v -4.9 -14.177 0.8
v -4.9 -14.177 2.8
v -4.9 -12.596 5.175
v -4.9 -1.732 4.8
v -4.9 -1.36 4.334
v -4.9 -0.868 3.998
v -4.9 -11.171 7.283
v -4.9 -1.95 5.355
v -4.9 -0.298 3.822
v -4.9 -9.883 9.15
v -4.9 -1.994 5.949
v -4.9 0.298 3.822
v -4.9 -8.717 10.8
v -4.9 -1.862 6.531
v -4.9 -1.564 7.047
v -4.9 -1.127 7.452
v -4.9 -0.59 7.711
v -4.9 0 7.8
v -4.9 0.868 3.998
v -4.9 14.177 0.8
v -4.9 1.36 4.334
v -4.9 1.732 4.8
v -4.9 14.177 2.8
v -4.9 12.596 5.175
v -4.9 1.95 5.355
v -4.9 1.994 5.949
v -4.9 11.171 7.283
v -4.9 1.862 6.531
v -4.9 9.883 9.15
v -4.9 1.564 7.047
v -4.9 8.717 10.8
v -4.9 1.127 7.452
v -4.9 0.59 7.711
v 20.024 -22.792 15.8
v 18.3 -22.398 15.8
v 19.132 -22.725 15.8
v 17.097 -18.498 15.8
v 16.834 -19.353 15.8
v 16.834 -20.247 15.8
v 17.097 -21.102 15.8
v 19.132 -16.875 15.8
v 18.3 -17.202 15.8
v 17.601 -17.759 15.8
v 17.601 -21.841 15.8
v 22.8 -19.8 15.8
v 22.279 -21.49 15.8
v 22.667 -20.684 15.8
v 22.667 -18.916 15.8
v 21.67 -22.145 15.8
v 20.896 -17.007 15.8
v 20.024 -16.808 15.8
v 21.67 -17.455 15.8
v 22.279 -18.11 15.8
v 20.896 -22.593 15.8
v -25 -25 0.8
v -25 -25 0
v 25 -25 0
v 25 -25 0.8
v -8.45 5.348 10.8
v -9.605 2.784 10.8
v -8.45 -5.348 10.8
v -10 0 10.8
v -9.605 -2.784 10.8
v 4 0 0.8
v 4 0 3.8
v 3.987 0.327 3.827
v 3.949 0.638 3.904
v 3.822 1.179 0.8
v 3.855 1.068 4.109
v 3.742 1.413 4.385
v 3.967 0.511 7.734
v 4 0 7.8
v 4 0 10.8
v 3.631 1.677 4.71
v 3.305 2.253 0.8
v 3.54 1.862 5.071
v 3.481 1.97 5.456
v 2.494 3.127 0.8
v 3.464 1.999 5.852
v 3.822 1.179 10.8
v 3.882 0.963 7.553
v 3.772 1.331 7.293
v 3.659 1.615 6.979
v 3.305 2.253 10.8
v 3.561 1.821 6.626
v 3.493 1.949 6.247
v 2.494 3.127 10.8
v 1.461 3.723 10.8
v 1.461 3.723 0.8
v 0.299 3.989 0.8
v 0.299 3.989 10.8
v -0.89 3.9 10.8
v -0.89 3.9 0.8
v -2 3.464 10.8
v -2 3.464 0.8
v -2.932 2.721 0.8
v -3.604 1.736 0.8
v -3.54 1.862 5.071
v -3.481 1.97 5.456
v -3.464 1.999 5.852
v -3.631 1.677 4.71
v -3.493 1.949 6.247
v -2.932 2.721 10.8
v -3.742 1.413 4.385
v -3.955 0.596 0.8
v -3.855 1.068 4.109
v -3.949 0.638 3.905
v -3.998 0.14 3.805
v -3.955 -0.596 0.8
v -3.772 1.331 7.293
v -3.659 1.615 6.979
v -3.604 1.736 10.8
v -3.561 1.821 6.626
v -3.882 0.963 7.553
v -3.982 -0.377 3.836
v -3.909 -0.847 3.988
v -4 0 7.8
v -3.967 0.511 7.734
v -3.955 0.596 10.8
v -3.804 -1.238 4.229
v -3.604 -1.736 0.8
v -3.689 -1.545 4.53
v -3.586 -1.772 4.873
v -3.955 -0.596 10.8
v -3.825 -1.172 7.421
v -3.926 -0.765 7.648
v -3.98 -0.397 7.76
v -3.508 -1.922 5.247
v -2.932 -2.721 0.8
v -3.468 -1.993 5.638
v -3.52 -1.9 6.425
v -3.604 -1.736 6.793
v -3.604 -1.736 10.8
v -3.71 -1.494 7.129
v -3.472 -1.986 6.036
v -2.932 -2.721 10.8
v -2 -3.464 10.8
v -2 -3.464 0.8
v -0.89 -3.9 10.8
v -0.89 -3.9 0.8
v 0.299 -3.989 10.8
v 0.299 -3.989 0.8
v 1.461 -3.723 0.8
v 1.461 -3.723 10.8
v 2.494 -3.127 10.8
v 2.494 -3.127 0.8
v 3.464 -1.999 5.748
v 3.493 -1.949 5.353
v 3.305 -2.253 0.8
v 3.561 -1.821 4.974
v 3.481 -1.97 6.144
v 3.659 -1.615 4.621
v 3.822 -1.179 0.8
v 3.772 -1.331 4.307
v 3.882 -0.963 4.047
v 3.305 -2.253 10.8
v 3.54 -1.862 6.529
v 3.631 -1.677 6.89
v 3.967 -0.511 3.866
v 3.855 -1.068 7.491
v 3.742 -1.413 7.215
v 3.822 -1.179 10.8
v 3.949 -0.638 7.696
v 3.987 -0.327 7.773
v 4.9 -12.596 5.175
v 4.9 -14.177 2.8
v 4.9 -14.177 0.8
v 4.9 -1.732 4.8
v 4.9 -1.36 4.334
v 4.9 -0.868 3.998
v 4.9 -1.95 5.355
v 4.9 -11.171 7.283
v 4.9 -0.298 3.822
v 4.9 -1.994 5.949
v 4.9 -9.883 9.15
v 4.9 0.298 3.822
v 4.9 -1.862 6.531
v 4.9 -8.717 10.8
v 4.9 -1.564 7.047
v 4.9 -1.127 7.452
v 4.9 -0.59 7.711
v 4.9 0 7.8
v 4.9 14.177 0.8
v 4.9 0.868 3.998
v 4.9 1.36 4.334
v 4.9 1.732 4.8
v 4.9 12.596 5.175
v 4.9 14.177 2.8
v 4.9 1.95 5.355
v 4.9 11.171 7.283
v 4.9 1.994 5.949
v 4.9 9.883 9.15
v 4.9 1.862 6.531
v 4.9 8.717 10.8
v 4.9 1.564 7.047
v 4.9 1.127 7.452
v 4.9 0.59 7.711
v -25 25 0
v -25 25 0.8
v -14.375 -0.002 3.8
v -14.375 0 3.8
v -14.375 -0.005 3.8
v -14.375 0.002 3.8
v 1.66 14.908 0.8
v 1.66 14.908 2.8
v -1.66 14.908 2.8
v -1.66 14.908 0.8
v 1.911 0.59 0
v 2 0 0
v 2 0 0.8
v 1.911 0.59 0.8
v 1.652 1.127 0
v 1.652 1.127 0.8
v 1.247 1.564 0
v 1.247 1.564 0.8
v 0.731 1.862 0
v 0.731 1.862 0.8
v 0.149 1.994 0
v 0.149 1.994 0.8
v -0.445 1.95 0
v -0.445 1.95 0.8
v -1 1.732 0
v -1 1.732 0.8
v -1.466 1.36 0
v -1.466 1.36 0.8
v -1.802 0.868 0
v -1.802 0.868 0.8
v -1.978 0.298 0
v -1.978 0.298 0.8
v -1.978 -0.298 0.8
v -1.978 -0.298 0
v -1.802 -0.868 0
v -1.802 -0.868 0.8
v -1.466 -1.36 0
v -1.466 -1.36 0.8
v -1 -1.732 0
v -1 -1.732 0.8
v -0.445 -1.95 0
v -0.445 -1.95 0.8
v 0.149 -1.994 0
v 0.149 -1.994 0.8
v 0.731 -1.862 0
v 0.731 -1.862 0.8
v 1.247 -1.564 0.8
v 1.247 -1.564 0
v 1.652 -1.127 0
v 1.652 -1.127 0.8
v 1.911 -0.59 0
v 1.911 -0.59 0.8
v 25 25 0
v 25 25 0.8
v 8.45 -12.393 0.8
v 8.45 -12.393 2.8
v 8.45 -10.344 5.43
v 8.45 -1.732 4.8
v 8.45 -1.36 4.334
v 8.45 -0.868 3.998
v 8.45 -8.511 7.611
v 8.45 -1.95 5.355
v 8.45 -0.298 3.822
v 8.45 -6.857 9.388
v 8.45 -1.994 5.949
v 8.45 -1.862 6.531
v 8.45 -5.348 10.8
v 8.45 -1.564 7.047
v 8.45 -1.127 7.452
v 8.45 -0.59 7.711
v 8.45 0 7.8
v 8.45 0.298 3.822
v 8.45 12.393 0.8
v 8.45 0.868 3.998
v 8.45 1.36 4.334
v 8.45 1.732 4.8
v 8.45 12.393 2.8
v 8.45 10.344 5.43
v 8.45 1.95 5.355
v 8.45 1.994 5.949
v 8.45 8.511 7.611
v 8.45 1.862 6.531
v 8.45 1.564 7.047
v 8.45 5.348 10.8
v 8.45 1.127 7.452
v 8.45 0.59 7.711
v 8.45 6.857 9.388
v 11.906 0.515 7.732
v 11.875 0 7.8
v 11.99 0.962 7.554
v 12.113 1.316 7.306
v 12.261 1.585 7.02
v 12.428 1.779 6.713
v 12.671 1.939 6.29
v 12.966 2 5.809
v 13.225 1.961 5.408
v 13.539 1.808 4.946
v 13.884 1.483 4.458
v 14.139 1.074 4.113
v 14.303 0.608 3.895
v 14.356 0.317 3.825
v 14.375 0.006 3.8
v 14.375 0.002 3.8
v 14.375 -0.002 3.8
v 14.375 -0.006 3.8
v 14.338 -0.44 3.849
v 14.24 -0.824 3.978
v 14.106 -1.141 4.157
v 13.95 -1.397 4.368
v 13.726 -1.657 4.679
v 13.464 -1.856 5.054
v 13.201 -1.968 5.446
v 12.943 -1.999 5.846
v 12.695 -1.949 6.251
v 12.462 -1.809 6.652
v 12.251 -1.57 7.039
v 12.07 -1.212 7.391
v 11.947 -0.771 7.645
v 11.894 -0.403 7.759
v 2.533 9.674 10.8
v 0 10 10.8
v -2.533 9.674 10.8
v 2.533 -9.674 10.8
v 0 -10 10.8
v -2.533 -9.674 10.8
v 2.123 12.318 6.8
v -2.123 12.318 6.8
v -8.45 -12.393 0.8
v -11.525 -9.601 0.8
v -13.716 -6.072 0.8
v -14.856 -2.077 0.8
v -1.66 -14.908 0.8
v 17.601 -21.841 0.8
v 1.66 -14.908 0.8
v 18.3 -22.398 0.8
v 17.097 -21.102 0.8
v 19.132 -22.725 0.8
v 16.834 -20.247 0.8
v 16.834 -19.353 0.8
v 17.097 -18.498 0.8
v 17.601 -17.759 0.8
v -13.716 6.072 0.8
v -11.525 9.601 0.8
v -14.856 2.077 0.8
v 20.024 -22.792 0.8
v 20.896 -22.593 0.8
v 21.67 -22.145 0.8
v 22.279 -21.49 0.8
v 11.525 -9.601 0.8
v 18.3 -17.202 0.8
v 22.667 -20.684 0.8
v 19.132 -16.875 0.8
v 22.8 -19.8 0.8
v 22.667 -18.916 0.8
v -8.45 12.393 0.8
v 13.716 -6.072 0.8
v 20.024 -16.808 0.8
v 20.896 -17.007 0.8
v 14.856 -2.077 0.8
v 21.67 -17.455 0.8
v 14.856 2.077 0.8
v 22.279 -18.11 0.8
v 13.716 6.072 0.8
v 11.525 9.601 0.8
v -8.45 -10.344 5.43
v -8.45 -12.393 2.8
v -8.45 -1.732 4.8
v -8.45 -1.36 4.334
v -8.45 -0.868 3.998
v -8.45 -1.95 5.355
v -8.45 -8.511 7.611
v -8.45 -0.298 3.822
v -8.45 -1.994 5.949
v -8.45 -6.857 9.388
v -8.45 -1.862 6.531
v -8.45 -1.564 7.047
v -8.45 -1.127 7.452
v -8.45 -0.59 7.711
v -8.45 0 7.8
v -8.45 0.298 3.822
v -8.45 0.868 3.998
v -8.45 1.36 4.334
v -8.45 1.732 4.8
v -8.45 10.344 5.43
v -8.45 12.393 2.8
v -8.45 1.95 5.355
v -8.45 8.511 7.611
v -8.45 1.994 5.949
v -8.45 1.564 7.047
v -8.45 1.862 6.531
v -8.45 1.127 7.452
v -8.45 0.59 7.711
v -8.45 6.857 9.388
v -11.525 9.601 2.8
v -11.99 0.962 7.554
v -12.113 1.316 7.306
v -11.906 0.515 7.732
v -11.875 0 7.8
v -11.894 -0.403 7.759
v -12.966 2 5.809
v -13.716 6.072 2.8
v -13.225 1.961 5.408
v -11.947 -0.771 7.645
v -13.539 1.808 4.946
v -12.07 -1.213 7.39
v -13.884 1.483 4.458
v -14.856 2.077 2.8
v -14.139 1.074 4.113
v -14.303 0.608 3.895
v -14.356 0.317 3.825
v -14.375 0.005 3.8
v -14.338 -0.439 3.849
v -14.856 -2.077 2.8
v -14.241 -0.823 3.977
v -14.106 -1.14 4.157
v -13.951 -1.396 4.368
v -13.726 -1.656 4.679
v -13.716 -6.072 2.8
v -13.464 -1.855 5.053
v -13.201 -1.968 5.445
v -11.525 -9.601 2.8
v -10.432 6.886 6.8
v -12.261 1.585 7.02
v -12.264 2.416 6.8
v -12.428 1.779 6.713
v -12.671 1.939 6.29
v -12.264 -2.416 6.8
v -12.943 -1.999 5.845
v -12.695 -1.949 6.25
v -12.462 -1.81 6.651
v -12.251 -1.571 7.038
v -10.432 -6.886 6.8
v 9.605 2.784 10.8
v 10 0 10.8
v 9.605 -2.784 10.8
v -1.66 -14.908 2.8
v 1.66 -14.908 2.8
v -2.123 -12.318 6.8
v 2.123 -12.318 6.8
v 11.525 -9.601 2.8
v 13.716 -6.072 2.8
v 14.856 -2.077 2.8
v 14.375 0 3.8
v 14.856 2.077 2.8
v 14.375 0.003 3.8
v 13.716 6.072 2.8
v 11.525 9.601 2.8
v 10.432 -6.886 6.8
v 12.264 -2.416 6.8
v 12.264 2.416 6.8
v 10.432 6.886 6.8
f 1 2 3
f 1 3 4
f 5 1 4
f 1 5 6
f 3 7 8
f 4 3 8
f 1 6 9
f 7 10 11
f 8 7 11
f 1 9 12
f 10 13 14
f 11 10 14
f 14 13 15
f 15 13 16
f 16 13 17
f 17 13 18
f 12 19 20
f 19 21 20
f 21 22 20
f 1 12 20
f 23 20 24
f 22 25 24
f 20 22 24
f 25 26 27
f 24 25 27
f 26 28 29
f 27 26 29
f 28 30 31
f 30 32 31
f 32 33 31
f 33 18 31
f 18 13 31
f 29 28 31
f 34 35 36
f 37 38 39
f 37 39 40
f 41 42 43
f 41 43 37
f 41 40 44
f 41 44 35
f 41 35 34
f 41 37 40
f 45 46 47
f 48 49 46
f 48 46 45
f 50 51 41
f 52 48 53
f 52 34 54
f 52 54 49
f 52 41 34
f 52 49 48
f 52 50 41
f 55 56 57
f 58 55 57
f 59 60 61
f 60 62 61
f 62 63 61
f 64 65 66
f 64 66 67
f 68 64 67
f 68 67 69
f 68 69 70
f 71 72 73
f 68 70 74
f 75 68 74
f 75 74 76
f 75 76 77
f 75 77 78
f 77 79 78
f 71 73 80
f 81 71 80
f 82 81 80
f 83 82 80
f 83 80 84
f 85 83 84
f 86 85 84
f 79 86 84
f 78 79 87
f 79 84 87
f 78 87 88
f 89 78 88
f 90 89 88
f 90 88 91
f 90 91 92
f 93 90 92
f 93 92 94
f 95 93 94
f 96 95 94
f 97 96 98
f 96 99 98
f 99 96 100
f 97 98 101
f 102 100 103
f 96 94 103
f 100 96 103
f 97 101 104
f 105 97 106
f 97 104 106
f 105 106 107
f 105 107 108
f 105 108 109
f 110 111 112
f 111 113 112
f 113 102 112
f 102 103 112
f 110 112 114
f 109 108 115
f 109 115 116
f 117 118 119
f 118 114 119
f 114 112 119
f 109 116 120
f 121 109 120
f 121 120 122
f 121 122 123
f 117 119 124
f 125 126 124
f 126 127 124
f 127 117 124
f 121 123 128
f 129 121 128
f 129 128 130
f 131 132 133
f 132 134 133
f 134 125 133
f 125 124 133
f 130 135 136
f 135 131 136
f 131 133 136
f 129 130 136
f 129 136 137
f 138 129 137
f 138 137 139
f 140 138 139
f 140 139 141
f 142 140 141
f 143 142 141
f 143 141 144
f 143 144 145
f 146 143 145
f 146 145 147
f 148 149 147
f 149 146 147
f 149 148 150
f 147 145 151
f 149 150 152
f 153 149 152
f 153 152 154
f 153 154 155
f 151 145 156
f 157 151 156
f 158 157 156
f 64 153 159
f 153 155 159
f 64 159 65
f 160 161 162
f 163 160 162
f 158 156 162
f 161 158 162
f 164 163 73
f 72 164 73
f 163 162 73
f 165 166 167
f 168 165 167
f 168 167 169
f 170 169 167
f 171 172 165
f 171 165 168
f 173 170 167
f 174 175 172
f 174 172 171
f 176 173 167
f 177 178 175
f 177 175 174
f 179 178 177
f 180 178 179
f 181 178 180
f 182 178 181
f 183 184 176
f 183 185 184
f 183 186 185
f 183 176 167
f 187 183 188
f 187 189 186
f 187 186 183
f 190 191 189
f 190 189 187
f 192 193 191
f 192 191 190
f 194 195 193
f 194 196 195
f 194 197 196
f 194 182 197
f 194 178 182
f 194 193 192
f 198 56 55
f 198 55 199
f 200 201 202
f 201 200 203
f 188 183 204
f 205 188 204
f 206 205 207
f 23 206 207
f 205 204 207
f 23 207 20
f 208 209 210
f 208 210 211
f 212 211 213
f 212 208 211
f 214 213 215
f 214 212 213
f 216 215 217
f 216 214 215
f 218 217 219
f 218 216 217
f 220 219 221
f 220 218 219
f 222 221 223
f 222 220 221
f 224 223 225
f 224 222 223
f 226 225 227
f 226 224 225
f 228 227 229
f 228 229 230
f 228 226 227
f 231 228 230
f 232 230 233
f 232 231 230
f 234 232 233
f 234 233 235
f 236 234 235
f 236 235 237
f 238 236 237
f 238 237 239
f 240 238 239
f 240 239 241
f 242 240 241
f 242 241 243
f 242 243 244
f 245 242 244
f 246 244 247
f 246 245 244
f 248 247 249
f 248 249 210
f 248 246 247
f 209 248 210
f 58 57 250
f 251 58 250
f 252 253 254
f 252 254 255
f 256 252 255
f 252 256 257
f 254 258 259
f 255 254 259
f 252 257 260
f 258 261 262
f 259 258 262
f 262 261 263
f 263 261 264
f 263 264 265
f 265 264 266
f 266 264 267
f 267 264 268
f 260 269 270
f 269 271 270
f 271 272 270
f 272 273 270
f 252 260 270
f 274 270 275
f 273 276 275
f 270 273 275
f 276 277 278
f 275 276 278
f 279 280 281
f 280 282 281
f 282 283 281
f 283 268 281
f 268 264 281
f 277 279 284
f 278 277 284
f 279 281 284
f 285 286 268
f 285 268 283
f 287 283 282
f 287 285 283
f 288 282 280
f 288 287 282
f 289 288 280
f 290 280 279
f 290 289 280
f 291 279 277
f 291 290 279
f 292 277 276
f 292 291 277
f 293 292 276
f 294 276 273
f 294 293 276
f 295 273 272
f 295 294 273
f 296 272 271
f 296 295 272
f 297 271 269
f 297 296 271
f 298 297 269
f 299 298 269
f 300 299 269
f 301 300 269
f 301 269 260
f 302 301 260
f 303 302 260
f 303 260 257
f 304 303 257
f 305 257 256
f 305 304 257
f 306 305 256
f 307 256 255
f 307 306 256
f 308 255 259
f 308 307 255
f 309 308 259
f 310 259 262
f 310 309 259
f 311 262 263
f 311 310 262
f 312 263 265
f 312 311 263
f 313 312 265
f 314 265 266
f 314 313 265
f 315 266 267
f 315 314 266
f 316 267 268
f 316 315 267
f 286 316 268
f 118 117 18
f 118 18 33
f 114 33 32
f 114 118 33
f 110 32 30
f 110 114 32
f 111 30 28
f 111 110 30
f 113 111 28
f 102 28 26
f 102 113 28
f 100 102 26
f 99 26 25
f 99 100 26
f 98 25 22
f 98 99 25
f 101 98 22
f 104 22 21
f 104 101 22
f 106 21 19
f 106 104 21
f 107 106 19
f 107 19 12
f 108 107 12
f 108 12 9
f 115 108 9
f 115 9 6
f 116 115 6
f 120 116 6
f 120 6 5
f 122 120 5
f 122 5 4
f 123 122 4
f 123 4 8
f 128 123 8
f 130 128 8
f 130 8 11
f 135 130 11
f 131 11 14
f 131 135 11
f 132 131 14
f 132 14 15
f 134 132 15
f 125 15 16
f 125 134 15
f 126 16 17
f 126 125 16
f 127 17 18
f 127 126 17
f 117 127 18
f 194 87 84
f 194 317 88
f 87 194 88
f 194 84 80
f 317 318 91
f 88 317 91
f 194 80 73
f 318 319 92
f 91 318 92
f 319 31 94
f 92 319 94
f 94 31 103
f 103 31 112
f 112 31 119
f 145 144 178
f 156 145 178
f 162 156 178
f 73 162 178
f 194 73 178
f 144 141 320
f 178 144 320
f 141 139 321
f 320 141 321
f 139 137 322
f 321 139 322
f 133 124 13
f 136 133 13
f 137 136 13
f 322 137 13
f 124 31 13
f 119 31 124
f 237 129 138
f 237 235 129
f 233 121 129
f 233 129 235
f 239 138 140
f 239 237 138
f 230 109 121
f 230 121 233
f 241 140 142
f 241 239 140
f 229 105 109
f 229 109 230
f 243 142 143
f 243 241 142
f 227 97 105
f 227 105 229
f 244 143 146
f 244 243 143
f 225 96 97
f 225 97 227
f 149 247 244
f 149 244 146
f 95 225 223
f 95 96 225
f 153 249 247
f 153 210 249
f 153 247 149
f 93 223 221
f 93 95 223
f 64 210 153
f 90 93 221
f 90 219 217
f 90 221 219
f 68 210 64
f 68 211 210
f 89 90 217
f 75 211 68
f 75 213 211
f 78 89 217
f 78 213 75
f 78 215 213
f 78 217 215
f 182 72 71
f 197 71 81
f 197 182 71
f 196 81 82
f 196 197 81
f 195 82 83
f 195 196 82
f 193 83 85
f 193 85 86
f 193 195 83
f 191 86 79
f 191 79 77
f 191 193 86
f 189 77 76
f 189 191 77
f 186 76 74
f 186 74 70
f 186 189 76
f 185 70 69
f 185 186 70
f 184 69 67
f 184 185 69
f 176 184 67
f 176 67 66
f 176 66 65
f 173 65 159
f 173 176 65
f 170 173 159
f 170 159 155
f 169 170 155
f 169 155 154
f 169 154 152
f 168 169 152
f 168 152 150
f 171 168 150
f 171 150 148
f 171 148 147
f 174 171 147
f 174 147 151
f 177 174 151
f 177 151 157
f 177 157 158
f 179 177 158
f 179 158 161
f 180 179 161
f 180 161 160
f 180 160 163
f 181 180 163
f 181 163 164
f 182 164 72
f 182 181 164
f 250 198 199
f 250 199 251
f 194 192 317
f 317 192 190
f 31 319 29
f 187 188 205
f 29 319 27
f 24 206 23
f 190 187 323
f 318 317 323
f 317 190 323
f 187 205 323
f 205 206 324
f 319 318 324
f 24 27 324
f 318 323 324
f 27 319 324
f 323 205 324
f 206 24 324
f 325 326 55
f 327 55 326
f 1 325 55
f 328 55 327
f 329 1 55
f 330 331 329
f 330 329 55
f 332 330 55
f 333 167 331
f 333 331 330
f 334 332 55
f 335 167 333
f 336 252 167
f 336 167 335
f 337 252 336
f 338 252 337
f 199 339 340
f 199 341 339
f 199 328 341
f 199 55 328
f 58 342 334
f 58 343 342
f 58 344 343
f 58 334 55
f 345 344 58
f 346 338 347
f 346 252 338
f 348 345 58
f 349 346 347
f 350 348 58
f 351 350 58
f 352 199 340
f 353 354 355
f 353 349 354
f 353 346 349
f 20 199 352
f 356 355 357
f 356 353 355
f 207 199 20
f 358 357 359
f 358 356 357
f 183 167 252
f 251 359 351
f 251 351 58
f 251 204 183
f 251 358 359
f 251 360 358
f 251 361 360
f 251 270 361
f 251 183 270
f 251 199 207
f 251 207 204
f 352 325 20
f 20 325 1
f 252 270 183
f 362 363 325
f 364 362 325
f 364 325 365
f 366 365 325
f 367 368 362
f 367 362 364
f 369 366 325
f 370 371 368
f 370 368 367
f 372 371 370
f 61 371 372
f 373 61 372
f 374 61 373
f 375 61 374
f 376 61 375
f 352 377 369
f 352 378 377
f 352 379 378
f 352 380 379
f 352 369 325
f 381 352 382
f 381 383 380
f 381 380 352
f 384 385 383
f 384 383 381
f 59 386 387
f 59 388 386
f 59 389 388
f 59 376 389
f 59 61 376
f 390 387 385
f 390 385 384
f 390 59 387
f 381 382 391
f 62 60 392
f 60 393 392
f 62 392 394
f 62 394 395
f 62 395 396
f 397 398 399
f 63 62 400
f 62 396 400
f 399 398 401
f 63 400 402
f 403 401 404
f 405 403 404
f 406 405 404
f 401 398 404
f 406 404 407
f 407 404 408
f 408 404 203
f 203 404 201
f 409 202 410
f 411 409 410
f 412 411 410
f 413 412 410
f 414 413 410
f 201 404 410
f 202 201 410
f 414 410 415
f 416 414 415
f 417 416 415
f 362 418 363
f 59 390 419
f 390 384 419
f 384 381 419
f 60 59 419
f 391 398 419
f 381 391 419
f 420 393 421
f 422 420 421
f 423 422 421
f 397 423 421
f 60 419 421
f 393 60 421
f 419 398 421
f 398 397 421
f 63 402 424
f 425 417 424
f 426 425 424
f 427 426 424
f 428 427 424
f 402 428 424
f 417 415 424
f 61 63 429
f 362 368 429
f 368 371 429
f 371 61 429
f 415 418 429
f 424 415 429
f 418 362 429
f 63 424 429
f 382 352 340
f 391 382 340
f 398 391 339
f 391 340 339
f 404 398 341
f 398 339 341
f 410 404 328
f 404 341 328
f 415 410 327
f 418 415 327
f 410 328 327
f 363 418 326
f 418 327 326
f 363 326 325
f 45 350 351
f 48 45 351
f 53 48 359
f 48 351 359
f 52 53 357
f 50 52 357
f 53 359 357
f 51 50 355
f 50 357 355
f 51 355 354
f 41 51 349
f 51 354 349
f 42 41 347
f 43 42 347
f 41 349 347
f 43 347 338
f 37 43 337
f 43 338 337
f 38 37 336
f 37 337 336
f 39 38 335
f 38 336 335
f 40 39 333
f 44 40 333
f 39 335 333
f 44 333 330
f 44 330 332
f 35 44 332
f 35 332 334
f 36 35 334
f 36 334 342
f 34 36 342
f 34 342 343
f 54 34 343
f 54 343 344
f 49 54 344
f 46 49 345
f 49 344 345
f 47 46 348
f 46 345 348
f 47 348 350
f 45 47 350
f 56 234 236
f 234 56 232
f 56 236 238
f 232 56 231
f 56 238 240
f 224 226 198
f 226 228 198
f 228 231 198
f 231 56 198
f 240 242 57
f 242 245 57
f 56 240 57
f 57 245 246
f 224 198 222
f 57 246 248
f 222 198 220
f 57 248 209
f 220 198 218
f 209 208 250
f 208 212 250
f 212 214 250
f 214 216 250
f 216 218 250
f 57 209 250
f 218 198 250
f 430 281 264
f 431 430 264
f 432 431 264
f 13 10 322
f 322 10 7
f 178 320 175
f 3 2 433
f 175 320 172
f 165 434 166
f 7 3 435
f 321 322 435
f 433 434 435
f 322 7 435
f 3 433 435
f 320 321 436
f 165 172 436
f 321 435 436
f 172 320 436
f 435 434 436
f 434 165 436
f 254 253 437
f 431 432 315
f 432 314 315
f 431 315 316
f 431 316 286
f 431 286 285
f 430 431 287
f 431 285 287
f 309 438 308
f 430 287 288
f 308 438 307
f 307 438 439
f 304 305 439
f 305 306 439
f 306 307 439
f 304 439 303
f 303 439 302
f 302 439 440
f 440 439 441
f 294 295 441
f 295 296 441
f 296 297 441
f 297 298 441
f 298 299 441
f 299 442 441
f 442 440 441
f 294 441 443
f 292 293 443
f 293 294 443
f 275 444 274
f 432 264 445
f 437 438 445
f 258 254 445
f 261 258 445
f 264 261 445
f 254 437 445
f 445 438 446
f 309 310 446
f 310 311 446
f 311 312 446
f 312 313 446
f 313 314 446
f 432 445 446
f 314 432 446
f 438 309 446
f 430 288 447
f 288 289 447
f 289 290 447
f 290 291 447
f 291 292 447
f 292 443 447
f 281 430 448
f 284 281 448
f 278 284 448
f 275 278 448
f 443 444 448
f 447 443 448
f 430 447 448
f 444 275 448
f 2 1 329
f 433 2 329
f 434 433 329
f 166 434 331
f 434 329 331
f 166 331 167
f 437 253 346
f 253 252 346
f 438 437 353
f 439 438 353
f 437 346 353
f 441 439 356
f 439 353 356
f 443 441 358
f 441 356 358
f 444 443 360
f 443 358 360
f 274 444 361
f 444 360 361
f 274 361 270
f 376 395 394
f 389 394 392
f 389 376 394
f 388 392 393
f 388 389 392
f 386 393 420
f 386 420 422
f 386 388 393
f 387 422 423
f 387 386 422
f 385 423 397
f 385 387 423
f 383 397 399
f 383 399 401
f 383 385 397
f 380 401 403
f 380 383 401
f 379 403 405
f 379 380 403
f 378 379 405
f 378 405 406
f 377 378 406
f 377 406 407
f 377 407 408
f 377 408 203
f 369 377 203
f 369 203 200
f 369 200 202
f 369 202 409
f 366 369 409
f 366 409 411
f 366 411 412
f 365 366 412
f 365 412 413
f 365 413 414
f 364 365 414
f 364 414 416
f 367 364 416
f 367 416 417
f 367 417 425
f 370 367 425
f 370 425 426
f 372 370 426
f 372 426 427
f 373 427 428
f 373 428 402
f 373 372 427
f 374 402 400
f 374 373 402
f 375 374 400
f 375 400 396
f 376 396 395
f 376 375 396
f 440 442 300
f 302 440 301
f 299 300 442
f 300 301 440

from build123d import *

# Parameters (mm, degrees)
CROQUIS1_W              = 50
CROQUIS1_H              = 50
CROQUIS1_R              = 2
SALIENTE_EXTRUIR2_DEPTH = 0.8
CROQUIS4_R              = 4
CROQUIS4_W              = 3.55
CROQUIS4_H              = 40
CORTAR_EXTRUIR1_DEPTH   = 10
CORTAR_EXTRUIR2_START   = -39.374993
CROQUIS7_R              = 2
CORTAR_EXTRUIR2_DEPTH   = 28.749989
CROQUIS8_R              = 3
SALIENTE_EXTRUIR3_DEPTH = 15


with BuildPart() as part:
    # Croquis1 → Saliente-Extruir2 (new body)
    with BuildSketch(Plane.XY):
        Rectangle(CROQUIS1_W, CROQUIS1_H)
        Circle(CROQUIS1_R, mode=Mode.SUBTRACT)
    extrude(amount=SALIENTE_EXTRUIR2_DEPTH)

    # Croquis2 → Revolución1 (revolve)
    with BuildSketch(Plane(origin=(0, 0, 0), x_dir=(0, 0, -1), z_dir=(1, 0, 0))):
        Polygon((-0.8, 0), (-10.8, 0), (-10.8, 10), (-2.8, 15), (-0.8, 15), align=None)
    revolve(axis=Axis((0, 0, 0.8), (0, 0, 1)))

    # Croquis4 → Cortar-Extruir1 (cut)
    with BuildSketch(Plane.XY.offset(10.8)):
        Circle(CROQUIS4_R)
        with Locations((-6.675, 0)):
            Rectangle(CROQUIS4_W, CROQUIS4_H)
        with Locations((6.675, 0)):
            Rectangle(CROQUIS4_W, CROQUIS4_H)
    extrude(amount=-CORTAR_EXTRUIR1_DEPTH, mode=Mode.SUBTRACT)

    # Croquis7 → Cortar-Extruir2 (cut)
    with BuildSketch(Plane.ZY.offset(25).offset(CORTAR_EXTRUIR2_START)):
        with Locations((5.8, 0)):
            Circle(CROQUIS7_R)
    extrude(amount=CORTAR_EXTRUIR2_DEPTH, mode=Mode.SUBTRACT)

    # Croquis8 → Saliente-Extruir3 (add)
    with BuildSketch(Plane.XY.offset(0.8)):
        with Locations((19.8, -19.8)):
            Circle(CROQUIS8_R)
    extrude(amount=SALIENTE_EXTRUIR3_DEPTH)


solid = part.part
